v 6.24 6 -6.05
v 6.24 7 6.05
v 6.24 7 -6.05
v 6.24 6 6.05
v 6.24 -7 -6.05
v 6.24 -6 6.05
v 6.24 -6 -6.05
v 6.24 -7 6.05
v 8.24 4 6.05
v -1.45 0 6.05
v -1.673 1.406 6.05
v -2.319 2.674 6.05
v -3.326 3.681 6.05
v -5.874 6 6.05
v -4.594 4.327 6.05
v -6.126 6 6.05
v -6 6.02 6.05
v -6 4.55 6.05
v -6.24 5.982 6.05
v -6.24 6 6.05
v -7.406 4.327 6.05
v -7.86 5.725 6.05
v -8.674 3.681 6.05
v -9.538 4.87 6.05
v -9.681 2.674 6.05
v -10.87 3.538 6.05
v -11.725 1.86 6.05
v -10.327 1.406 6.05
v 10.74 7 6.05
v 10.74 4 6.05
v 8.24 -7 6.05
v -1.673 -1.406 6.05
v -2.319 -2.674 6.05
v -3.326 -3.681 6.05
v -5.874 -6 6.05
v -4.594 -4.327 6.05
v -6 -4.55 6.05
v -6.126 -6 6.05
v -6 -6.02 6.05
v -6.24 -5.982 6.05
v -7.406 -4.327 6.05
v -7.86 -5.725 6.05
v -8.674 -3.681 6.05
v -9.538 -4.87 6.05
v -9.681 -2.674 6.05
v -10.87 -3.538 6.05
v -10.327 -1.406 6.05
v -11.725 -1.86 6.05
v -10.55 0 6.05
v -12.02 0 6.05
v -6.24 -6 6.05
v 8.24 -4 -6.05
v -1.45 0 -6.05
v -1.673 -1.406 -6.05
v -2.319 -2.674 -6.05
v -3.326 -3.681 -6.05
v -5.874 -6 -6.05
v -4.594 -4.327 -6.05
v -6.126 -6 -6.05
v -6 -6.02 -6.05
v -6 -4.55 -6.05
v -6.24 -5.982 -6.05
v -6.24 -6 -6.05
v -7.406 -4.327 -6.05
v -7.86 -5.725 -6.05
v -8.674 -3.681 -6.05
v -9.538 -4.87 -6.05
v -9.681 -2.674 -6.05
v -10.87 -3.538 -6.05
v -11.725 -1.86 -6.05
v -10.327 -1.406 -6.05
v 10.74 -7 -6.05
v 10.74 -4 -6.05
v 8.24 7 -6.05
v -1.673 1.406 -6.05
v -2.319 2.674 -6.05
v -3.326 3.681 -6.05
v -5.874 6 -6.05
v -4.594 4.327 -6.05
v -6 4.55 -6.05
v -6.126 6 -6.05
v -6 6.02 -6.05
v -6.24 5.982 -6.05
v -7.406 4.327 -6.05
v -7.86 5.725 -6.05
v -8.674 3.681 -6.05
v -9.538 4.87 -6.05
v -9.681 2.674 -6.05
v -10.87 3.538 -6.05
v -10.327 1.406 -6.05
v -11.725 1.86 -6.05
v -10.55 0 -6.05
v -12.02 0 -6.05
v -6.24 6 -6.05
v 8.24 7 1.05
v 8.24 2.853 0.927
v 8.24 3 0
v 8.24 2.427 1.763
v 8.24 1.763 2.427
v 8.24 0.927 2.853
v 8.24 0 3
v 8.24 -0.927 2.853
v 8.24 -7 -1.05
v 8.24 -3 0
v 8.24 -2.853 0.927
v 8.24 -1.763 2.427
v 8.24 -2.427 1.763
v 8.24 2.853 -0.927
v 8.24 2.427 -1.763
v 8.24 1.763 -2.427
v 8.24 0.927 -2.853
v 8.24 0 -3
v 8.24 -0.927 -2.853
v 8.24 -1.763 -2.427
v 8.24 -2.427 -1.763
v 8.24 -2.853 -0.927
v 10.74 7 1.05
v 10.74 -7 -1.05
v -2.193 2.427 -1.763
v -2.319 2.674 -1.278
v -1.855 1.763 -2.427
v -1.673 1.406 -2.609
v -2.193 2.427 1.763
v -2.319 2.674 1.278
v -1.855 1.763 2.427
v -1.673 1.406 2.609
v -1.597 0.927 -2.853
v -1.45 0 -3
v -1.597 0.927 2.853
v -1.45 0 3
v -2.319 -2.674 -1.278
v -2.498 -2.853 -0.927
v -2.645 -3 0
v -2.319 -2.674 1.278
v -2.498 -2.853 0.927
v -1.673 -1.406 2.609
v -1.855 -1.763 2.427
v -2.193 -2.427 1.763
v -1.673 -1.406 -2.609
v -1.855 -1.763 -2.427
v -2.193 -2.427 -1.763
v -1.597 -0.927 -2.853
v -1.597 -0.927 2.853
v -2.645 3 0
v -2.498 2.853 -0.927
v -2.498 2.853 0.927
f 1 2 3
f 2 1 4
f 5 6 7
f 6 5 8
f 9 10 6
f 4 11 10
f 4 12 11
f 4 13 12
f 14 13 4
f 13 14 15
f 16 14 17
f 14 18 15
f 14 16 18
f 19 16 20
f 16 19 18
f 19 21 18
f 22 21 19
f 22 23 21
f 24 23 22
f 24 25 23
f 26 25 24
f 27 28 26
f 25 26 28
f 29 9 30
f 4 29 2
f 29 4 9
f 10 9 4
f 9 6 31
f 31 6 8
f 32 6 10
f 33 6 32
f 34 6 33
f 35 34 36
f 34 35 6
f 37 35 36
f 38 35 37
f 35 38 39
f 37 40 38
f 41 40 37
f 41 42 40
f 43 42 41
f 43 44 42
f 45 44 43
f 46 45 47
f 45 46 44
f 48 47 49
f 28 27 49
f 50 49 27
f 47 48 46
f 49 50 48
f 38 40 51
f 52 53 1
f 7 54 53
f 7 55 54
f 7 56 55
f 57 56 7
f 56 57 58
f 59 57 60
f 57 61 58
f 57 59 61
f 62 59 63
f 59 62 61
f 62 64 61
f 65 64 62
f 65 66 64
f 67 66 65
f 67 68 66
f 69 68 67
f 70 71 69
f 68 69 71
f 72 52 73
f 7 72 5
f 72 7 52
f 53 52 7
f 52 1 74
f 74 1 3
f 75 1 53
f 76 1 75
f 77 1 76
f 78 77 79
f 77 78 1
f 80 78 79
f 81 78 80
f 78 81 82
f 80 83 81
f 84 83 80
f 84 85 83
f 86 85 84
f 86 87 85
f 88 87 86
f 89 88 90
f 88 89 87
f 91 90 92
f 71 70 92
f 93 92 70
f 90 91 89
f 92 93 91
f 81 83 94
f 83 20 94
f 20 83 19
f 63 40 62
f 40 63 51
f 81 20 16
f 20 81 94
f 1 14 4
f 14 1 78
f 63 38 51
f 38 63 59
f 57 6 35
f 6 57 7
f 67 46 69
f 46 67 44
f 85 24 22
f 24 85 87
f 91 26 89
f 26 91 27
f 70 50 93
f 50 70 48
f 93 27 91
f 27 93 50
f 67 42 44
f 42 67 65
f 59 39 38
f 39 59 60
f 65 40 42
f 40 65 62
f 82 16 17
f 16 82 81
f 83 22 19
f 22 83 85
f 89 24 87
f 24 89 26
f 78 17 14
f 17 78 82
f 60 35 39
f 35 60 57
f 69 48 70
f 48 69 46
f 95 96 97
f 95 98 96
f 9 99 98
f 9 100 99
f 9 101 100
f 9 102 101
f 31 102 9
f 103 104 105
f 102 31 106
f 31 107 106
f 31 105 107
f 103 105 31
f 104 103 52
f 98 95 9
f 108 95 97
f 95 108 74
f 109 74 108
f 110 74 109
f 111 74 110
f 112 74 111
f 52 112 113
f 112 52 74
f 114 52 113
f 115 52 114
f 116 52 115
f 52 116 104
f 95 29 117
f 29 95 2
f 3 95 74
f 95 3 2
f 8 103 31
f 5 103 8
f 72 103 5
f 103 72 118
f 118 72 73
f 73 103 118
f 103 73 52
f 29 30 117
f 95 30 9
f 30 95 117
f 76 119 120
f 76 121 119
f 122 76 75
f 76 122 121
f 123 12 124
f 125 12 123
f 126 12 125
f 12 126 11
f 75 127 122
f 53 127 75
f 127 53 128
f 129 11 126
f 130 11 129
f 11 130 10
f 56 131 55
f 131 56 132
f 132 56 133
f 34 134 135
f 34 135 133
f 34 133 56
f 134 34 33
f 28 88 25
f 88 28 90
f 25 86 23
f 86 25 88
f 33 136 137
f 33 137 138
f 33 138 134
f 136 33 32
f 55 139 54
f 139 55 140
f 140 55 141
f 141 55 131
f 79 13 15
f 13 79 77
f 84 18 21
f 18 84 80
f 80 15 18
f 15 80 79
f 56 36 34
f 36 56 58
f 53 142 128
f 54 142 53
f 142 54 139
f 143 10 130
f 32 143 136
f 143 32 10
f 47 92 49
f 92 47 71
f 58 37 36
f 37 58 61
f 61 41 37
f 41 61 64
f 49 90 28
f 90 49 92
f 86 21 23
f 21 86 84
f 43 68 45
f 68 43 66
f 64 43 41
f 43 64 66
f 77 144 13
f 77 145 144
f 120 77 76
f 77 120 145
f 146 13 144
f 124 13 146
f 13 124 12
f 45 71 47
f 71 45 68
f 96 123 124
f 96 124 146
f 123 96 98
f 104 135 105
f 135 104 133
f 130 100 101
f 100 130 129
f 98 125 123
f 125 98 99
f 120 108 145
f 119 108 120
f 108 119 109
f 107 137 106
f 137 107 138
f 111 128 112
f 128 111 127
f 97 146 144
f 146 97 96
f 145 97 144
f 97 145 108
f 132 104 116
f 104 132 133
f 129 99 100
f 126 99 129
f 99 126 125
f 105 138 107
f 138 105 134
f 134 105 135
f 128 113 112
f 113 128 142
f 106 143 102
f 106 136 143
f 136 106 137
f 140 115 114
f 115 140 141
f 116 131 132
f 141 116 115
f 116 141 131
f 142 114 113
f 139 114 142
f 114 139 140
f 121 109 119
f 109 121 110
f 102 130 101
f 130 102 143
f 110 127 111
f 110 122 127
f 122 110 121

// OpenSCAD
// render nicely
$fn= 20;
//////////////////////////////////////////
// parameters
//////////////////////////////////////////
// length without triangular stops
total_x = 20.5;
// x-length of solid square part
x = 12.48;  
// total y
y = 12;     
// total z
z = 12.1; 

/**
 * Base plate
 */
// the base plate x-thickness
xbase = 2;
ybase = y + 2;
base_end = x/2 + xbase; 

/**
 * Stopper
 */
// triangular stopper thickness 
xstop = 2.5;
// triangular stopper height
zstop = 3;
// triangular stopper width
ystop = 5;

/**
 * round outer shell
 */
// total part X length = 20.5mm
rbase = total_x - xbase - x;
// door sliding pole diameter
dpole = 9.1;
rpole = dpole/2;
dxpole =  y/2;

/**
 * Screw
 */
// screw hole diameter
d_screw = 6.5;
// thread depth
thread_depth = 0.5;

rscrew = (d_screw - thread_depth)/2 ; 

hscrew = x + xbase; // screw hole length

//////////////////////////////////////////
// renderers
//////////////////////////////////////////
main();

//////////////////////////////////////////
// modules
//////////////////////////////////////////
/**
 * triangular prism
 * credits: 
 * https://www.youtube.com/watch?v=R1d_WNjafCo
 */
module triangular_prism(b, d, h, ht, sc){
    color("teal"){
        linear_extrude(height = ht, twist = 0, scale = sc){
            polygon(points = [[0, 0], [b, 0], [d, h]]);
        }
    }
}
/**
 * stoppers
 */
module stop(_x, _y, _z, dx, dir, angle){
    translate([dx, -dir * ybase/2, -dir * z/2]){
        rotate(a = 90, v = [1, 0, 0]){
            rotate(a = angle, v = [0, 1, 0]){
                triangular_prism(_x, 0, _y, _z, 1);
            }
        }
    }
}
/**
 * main block
 */
module block(){
    // main part
    cube([x, y, z], center = true);
    // outer pole shell
    translate([-dxpole,0,-z/2]) {
        cylinder(h = z, r = rbase, center = false); 
    }
    // base plate
    color("teal"){
        translate([x/2,-ybase/2,-z/2]){
            cube ([xbase, ybase, z]);
        }
    }
    stop(zstop, ystop, xstop, base_end, 1, 90);
    stop(zstop, -ystop, xstop, base_end + xstop, -1, -90);

}
/**
 * pole hole
 */
module pole_hole(){
    translate([-dxpole,0,-z/2]) {
            cylinder(h = z, r = rpole, center = false); 
    }
}
/**
 * screw hole
 */
module screw_hole(){
    translate([base_end, 0, 0]) {
        rotate(a = 90, v = [0, -1, 0]){
            cylinder(h = hscrew, r = rscrew, center = false); 
        }
    }
}
/**
 * main method
 */
module main(){
    difference(){
        difference(){
            //        
            block();
            pole_hole();       
        }
        // screw
        screw_hole();
    }
}
